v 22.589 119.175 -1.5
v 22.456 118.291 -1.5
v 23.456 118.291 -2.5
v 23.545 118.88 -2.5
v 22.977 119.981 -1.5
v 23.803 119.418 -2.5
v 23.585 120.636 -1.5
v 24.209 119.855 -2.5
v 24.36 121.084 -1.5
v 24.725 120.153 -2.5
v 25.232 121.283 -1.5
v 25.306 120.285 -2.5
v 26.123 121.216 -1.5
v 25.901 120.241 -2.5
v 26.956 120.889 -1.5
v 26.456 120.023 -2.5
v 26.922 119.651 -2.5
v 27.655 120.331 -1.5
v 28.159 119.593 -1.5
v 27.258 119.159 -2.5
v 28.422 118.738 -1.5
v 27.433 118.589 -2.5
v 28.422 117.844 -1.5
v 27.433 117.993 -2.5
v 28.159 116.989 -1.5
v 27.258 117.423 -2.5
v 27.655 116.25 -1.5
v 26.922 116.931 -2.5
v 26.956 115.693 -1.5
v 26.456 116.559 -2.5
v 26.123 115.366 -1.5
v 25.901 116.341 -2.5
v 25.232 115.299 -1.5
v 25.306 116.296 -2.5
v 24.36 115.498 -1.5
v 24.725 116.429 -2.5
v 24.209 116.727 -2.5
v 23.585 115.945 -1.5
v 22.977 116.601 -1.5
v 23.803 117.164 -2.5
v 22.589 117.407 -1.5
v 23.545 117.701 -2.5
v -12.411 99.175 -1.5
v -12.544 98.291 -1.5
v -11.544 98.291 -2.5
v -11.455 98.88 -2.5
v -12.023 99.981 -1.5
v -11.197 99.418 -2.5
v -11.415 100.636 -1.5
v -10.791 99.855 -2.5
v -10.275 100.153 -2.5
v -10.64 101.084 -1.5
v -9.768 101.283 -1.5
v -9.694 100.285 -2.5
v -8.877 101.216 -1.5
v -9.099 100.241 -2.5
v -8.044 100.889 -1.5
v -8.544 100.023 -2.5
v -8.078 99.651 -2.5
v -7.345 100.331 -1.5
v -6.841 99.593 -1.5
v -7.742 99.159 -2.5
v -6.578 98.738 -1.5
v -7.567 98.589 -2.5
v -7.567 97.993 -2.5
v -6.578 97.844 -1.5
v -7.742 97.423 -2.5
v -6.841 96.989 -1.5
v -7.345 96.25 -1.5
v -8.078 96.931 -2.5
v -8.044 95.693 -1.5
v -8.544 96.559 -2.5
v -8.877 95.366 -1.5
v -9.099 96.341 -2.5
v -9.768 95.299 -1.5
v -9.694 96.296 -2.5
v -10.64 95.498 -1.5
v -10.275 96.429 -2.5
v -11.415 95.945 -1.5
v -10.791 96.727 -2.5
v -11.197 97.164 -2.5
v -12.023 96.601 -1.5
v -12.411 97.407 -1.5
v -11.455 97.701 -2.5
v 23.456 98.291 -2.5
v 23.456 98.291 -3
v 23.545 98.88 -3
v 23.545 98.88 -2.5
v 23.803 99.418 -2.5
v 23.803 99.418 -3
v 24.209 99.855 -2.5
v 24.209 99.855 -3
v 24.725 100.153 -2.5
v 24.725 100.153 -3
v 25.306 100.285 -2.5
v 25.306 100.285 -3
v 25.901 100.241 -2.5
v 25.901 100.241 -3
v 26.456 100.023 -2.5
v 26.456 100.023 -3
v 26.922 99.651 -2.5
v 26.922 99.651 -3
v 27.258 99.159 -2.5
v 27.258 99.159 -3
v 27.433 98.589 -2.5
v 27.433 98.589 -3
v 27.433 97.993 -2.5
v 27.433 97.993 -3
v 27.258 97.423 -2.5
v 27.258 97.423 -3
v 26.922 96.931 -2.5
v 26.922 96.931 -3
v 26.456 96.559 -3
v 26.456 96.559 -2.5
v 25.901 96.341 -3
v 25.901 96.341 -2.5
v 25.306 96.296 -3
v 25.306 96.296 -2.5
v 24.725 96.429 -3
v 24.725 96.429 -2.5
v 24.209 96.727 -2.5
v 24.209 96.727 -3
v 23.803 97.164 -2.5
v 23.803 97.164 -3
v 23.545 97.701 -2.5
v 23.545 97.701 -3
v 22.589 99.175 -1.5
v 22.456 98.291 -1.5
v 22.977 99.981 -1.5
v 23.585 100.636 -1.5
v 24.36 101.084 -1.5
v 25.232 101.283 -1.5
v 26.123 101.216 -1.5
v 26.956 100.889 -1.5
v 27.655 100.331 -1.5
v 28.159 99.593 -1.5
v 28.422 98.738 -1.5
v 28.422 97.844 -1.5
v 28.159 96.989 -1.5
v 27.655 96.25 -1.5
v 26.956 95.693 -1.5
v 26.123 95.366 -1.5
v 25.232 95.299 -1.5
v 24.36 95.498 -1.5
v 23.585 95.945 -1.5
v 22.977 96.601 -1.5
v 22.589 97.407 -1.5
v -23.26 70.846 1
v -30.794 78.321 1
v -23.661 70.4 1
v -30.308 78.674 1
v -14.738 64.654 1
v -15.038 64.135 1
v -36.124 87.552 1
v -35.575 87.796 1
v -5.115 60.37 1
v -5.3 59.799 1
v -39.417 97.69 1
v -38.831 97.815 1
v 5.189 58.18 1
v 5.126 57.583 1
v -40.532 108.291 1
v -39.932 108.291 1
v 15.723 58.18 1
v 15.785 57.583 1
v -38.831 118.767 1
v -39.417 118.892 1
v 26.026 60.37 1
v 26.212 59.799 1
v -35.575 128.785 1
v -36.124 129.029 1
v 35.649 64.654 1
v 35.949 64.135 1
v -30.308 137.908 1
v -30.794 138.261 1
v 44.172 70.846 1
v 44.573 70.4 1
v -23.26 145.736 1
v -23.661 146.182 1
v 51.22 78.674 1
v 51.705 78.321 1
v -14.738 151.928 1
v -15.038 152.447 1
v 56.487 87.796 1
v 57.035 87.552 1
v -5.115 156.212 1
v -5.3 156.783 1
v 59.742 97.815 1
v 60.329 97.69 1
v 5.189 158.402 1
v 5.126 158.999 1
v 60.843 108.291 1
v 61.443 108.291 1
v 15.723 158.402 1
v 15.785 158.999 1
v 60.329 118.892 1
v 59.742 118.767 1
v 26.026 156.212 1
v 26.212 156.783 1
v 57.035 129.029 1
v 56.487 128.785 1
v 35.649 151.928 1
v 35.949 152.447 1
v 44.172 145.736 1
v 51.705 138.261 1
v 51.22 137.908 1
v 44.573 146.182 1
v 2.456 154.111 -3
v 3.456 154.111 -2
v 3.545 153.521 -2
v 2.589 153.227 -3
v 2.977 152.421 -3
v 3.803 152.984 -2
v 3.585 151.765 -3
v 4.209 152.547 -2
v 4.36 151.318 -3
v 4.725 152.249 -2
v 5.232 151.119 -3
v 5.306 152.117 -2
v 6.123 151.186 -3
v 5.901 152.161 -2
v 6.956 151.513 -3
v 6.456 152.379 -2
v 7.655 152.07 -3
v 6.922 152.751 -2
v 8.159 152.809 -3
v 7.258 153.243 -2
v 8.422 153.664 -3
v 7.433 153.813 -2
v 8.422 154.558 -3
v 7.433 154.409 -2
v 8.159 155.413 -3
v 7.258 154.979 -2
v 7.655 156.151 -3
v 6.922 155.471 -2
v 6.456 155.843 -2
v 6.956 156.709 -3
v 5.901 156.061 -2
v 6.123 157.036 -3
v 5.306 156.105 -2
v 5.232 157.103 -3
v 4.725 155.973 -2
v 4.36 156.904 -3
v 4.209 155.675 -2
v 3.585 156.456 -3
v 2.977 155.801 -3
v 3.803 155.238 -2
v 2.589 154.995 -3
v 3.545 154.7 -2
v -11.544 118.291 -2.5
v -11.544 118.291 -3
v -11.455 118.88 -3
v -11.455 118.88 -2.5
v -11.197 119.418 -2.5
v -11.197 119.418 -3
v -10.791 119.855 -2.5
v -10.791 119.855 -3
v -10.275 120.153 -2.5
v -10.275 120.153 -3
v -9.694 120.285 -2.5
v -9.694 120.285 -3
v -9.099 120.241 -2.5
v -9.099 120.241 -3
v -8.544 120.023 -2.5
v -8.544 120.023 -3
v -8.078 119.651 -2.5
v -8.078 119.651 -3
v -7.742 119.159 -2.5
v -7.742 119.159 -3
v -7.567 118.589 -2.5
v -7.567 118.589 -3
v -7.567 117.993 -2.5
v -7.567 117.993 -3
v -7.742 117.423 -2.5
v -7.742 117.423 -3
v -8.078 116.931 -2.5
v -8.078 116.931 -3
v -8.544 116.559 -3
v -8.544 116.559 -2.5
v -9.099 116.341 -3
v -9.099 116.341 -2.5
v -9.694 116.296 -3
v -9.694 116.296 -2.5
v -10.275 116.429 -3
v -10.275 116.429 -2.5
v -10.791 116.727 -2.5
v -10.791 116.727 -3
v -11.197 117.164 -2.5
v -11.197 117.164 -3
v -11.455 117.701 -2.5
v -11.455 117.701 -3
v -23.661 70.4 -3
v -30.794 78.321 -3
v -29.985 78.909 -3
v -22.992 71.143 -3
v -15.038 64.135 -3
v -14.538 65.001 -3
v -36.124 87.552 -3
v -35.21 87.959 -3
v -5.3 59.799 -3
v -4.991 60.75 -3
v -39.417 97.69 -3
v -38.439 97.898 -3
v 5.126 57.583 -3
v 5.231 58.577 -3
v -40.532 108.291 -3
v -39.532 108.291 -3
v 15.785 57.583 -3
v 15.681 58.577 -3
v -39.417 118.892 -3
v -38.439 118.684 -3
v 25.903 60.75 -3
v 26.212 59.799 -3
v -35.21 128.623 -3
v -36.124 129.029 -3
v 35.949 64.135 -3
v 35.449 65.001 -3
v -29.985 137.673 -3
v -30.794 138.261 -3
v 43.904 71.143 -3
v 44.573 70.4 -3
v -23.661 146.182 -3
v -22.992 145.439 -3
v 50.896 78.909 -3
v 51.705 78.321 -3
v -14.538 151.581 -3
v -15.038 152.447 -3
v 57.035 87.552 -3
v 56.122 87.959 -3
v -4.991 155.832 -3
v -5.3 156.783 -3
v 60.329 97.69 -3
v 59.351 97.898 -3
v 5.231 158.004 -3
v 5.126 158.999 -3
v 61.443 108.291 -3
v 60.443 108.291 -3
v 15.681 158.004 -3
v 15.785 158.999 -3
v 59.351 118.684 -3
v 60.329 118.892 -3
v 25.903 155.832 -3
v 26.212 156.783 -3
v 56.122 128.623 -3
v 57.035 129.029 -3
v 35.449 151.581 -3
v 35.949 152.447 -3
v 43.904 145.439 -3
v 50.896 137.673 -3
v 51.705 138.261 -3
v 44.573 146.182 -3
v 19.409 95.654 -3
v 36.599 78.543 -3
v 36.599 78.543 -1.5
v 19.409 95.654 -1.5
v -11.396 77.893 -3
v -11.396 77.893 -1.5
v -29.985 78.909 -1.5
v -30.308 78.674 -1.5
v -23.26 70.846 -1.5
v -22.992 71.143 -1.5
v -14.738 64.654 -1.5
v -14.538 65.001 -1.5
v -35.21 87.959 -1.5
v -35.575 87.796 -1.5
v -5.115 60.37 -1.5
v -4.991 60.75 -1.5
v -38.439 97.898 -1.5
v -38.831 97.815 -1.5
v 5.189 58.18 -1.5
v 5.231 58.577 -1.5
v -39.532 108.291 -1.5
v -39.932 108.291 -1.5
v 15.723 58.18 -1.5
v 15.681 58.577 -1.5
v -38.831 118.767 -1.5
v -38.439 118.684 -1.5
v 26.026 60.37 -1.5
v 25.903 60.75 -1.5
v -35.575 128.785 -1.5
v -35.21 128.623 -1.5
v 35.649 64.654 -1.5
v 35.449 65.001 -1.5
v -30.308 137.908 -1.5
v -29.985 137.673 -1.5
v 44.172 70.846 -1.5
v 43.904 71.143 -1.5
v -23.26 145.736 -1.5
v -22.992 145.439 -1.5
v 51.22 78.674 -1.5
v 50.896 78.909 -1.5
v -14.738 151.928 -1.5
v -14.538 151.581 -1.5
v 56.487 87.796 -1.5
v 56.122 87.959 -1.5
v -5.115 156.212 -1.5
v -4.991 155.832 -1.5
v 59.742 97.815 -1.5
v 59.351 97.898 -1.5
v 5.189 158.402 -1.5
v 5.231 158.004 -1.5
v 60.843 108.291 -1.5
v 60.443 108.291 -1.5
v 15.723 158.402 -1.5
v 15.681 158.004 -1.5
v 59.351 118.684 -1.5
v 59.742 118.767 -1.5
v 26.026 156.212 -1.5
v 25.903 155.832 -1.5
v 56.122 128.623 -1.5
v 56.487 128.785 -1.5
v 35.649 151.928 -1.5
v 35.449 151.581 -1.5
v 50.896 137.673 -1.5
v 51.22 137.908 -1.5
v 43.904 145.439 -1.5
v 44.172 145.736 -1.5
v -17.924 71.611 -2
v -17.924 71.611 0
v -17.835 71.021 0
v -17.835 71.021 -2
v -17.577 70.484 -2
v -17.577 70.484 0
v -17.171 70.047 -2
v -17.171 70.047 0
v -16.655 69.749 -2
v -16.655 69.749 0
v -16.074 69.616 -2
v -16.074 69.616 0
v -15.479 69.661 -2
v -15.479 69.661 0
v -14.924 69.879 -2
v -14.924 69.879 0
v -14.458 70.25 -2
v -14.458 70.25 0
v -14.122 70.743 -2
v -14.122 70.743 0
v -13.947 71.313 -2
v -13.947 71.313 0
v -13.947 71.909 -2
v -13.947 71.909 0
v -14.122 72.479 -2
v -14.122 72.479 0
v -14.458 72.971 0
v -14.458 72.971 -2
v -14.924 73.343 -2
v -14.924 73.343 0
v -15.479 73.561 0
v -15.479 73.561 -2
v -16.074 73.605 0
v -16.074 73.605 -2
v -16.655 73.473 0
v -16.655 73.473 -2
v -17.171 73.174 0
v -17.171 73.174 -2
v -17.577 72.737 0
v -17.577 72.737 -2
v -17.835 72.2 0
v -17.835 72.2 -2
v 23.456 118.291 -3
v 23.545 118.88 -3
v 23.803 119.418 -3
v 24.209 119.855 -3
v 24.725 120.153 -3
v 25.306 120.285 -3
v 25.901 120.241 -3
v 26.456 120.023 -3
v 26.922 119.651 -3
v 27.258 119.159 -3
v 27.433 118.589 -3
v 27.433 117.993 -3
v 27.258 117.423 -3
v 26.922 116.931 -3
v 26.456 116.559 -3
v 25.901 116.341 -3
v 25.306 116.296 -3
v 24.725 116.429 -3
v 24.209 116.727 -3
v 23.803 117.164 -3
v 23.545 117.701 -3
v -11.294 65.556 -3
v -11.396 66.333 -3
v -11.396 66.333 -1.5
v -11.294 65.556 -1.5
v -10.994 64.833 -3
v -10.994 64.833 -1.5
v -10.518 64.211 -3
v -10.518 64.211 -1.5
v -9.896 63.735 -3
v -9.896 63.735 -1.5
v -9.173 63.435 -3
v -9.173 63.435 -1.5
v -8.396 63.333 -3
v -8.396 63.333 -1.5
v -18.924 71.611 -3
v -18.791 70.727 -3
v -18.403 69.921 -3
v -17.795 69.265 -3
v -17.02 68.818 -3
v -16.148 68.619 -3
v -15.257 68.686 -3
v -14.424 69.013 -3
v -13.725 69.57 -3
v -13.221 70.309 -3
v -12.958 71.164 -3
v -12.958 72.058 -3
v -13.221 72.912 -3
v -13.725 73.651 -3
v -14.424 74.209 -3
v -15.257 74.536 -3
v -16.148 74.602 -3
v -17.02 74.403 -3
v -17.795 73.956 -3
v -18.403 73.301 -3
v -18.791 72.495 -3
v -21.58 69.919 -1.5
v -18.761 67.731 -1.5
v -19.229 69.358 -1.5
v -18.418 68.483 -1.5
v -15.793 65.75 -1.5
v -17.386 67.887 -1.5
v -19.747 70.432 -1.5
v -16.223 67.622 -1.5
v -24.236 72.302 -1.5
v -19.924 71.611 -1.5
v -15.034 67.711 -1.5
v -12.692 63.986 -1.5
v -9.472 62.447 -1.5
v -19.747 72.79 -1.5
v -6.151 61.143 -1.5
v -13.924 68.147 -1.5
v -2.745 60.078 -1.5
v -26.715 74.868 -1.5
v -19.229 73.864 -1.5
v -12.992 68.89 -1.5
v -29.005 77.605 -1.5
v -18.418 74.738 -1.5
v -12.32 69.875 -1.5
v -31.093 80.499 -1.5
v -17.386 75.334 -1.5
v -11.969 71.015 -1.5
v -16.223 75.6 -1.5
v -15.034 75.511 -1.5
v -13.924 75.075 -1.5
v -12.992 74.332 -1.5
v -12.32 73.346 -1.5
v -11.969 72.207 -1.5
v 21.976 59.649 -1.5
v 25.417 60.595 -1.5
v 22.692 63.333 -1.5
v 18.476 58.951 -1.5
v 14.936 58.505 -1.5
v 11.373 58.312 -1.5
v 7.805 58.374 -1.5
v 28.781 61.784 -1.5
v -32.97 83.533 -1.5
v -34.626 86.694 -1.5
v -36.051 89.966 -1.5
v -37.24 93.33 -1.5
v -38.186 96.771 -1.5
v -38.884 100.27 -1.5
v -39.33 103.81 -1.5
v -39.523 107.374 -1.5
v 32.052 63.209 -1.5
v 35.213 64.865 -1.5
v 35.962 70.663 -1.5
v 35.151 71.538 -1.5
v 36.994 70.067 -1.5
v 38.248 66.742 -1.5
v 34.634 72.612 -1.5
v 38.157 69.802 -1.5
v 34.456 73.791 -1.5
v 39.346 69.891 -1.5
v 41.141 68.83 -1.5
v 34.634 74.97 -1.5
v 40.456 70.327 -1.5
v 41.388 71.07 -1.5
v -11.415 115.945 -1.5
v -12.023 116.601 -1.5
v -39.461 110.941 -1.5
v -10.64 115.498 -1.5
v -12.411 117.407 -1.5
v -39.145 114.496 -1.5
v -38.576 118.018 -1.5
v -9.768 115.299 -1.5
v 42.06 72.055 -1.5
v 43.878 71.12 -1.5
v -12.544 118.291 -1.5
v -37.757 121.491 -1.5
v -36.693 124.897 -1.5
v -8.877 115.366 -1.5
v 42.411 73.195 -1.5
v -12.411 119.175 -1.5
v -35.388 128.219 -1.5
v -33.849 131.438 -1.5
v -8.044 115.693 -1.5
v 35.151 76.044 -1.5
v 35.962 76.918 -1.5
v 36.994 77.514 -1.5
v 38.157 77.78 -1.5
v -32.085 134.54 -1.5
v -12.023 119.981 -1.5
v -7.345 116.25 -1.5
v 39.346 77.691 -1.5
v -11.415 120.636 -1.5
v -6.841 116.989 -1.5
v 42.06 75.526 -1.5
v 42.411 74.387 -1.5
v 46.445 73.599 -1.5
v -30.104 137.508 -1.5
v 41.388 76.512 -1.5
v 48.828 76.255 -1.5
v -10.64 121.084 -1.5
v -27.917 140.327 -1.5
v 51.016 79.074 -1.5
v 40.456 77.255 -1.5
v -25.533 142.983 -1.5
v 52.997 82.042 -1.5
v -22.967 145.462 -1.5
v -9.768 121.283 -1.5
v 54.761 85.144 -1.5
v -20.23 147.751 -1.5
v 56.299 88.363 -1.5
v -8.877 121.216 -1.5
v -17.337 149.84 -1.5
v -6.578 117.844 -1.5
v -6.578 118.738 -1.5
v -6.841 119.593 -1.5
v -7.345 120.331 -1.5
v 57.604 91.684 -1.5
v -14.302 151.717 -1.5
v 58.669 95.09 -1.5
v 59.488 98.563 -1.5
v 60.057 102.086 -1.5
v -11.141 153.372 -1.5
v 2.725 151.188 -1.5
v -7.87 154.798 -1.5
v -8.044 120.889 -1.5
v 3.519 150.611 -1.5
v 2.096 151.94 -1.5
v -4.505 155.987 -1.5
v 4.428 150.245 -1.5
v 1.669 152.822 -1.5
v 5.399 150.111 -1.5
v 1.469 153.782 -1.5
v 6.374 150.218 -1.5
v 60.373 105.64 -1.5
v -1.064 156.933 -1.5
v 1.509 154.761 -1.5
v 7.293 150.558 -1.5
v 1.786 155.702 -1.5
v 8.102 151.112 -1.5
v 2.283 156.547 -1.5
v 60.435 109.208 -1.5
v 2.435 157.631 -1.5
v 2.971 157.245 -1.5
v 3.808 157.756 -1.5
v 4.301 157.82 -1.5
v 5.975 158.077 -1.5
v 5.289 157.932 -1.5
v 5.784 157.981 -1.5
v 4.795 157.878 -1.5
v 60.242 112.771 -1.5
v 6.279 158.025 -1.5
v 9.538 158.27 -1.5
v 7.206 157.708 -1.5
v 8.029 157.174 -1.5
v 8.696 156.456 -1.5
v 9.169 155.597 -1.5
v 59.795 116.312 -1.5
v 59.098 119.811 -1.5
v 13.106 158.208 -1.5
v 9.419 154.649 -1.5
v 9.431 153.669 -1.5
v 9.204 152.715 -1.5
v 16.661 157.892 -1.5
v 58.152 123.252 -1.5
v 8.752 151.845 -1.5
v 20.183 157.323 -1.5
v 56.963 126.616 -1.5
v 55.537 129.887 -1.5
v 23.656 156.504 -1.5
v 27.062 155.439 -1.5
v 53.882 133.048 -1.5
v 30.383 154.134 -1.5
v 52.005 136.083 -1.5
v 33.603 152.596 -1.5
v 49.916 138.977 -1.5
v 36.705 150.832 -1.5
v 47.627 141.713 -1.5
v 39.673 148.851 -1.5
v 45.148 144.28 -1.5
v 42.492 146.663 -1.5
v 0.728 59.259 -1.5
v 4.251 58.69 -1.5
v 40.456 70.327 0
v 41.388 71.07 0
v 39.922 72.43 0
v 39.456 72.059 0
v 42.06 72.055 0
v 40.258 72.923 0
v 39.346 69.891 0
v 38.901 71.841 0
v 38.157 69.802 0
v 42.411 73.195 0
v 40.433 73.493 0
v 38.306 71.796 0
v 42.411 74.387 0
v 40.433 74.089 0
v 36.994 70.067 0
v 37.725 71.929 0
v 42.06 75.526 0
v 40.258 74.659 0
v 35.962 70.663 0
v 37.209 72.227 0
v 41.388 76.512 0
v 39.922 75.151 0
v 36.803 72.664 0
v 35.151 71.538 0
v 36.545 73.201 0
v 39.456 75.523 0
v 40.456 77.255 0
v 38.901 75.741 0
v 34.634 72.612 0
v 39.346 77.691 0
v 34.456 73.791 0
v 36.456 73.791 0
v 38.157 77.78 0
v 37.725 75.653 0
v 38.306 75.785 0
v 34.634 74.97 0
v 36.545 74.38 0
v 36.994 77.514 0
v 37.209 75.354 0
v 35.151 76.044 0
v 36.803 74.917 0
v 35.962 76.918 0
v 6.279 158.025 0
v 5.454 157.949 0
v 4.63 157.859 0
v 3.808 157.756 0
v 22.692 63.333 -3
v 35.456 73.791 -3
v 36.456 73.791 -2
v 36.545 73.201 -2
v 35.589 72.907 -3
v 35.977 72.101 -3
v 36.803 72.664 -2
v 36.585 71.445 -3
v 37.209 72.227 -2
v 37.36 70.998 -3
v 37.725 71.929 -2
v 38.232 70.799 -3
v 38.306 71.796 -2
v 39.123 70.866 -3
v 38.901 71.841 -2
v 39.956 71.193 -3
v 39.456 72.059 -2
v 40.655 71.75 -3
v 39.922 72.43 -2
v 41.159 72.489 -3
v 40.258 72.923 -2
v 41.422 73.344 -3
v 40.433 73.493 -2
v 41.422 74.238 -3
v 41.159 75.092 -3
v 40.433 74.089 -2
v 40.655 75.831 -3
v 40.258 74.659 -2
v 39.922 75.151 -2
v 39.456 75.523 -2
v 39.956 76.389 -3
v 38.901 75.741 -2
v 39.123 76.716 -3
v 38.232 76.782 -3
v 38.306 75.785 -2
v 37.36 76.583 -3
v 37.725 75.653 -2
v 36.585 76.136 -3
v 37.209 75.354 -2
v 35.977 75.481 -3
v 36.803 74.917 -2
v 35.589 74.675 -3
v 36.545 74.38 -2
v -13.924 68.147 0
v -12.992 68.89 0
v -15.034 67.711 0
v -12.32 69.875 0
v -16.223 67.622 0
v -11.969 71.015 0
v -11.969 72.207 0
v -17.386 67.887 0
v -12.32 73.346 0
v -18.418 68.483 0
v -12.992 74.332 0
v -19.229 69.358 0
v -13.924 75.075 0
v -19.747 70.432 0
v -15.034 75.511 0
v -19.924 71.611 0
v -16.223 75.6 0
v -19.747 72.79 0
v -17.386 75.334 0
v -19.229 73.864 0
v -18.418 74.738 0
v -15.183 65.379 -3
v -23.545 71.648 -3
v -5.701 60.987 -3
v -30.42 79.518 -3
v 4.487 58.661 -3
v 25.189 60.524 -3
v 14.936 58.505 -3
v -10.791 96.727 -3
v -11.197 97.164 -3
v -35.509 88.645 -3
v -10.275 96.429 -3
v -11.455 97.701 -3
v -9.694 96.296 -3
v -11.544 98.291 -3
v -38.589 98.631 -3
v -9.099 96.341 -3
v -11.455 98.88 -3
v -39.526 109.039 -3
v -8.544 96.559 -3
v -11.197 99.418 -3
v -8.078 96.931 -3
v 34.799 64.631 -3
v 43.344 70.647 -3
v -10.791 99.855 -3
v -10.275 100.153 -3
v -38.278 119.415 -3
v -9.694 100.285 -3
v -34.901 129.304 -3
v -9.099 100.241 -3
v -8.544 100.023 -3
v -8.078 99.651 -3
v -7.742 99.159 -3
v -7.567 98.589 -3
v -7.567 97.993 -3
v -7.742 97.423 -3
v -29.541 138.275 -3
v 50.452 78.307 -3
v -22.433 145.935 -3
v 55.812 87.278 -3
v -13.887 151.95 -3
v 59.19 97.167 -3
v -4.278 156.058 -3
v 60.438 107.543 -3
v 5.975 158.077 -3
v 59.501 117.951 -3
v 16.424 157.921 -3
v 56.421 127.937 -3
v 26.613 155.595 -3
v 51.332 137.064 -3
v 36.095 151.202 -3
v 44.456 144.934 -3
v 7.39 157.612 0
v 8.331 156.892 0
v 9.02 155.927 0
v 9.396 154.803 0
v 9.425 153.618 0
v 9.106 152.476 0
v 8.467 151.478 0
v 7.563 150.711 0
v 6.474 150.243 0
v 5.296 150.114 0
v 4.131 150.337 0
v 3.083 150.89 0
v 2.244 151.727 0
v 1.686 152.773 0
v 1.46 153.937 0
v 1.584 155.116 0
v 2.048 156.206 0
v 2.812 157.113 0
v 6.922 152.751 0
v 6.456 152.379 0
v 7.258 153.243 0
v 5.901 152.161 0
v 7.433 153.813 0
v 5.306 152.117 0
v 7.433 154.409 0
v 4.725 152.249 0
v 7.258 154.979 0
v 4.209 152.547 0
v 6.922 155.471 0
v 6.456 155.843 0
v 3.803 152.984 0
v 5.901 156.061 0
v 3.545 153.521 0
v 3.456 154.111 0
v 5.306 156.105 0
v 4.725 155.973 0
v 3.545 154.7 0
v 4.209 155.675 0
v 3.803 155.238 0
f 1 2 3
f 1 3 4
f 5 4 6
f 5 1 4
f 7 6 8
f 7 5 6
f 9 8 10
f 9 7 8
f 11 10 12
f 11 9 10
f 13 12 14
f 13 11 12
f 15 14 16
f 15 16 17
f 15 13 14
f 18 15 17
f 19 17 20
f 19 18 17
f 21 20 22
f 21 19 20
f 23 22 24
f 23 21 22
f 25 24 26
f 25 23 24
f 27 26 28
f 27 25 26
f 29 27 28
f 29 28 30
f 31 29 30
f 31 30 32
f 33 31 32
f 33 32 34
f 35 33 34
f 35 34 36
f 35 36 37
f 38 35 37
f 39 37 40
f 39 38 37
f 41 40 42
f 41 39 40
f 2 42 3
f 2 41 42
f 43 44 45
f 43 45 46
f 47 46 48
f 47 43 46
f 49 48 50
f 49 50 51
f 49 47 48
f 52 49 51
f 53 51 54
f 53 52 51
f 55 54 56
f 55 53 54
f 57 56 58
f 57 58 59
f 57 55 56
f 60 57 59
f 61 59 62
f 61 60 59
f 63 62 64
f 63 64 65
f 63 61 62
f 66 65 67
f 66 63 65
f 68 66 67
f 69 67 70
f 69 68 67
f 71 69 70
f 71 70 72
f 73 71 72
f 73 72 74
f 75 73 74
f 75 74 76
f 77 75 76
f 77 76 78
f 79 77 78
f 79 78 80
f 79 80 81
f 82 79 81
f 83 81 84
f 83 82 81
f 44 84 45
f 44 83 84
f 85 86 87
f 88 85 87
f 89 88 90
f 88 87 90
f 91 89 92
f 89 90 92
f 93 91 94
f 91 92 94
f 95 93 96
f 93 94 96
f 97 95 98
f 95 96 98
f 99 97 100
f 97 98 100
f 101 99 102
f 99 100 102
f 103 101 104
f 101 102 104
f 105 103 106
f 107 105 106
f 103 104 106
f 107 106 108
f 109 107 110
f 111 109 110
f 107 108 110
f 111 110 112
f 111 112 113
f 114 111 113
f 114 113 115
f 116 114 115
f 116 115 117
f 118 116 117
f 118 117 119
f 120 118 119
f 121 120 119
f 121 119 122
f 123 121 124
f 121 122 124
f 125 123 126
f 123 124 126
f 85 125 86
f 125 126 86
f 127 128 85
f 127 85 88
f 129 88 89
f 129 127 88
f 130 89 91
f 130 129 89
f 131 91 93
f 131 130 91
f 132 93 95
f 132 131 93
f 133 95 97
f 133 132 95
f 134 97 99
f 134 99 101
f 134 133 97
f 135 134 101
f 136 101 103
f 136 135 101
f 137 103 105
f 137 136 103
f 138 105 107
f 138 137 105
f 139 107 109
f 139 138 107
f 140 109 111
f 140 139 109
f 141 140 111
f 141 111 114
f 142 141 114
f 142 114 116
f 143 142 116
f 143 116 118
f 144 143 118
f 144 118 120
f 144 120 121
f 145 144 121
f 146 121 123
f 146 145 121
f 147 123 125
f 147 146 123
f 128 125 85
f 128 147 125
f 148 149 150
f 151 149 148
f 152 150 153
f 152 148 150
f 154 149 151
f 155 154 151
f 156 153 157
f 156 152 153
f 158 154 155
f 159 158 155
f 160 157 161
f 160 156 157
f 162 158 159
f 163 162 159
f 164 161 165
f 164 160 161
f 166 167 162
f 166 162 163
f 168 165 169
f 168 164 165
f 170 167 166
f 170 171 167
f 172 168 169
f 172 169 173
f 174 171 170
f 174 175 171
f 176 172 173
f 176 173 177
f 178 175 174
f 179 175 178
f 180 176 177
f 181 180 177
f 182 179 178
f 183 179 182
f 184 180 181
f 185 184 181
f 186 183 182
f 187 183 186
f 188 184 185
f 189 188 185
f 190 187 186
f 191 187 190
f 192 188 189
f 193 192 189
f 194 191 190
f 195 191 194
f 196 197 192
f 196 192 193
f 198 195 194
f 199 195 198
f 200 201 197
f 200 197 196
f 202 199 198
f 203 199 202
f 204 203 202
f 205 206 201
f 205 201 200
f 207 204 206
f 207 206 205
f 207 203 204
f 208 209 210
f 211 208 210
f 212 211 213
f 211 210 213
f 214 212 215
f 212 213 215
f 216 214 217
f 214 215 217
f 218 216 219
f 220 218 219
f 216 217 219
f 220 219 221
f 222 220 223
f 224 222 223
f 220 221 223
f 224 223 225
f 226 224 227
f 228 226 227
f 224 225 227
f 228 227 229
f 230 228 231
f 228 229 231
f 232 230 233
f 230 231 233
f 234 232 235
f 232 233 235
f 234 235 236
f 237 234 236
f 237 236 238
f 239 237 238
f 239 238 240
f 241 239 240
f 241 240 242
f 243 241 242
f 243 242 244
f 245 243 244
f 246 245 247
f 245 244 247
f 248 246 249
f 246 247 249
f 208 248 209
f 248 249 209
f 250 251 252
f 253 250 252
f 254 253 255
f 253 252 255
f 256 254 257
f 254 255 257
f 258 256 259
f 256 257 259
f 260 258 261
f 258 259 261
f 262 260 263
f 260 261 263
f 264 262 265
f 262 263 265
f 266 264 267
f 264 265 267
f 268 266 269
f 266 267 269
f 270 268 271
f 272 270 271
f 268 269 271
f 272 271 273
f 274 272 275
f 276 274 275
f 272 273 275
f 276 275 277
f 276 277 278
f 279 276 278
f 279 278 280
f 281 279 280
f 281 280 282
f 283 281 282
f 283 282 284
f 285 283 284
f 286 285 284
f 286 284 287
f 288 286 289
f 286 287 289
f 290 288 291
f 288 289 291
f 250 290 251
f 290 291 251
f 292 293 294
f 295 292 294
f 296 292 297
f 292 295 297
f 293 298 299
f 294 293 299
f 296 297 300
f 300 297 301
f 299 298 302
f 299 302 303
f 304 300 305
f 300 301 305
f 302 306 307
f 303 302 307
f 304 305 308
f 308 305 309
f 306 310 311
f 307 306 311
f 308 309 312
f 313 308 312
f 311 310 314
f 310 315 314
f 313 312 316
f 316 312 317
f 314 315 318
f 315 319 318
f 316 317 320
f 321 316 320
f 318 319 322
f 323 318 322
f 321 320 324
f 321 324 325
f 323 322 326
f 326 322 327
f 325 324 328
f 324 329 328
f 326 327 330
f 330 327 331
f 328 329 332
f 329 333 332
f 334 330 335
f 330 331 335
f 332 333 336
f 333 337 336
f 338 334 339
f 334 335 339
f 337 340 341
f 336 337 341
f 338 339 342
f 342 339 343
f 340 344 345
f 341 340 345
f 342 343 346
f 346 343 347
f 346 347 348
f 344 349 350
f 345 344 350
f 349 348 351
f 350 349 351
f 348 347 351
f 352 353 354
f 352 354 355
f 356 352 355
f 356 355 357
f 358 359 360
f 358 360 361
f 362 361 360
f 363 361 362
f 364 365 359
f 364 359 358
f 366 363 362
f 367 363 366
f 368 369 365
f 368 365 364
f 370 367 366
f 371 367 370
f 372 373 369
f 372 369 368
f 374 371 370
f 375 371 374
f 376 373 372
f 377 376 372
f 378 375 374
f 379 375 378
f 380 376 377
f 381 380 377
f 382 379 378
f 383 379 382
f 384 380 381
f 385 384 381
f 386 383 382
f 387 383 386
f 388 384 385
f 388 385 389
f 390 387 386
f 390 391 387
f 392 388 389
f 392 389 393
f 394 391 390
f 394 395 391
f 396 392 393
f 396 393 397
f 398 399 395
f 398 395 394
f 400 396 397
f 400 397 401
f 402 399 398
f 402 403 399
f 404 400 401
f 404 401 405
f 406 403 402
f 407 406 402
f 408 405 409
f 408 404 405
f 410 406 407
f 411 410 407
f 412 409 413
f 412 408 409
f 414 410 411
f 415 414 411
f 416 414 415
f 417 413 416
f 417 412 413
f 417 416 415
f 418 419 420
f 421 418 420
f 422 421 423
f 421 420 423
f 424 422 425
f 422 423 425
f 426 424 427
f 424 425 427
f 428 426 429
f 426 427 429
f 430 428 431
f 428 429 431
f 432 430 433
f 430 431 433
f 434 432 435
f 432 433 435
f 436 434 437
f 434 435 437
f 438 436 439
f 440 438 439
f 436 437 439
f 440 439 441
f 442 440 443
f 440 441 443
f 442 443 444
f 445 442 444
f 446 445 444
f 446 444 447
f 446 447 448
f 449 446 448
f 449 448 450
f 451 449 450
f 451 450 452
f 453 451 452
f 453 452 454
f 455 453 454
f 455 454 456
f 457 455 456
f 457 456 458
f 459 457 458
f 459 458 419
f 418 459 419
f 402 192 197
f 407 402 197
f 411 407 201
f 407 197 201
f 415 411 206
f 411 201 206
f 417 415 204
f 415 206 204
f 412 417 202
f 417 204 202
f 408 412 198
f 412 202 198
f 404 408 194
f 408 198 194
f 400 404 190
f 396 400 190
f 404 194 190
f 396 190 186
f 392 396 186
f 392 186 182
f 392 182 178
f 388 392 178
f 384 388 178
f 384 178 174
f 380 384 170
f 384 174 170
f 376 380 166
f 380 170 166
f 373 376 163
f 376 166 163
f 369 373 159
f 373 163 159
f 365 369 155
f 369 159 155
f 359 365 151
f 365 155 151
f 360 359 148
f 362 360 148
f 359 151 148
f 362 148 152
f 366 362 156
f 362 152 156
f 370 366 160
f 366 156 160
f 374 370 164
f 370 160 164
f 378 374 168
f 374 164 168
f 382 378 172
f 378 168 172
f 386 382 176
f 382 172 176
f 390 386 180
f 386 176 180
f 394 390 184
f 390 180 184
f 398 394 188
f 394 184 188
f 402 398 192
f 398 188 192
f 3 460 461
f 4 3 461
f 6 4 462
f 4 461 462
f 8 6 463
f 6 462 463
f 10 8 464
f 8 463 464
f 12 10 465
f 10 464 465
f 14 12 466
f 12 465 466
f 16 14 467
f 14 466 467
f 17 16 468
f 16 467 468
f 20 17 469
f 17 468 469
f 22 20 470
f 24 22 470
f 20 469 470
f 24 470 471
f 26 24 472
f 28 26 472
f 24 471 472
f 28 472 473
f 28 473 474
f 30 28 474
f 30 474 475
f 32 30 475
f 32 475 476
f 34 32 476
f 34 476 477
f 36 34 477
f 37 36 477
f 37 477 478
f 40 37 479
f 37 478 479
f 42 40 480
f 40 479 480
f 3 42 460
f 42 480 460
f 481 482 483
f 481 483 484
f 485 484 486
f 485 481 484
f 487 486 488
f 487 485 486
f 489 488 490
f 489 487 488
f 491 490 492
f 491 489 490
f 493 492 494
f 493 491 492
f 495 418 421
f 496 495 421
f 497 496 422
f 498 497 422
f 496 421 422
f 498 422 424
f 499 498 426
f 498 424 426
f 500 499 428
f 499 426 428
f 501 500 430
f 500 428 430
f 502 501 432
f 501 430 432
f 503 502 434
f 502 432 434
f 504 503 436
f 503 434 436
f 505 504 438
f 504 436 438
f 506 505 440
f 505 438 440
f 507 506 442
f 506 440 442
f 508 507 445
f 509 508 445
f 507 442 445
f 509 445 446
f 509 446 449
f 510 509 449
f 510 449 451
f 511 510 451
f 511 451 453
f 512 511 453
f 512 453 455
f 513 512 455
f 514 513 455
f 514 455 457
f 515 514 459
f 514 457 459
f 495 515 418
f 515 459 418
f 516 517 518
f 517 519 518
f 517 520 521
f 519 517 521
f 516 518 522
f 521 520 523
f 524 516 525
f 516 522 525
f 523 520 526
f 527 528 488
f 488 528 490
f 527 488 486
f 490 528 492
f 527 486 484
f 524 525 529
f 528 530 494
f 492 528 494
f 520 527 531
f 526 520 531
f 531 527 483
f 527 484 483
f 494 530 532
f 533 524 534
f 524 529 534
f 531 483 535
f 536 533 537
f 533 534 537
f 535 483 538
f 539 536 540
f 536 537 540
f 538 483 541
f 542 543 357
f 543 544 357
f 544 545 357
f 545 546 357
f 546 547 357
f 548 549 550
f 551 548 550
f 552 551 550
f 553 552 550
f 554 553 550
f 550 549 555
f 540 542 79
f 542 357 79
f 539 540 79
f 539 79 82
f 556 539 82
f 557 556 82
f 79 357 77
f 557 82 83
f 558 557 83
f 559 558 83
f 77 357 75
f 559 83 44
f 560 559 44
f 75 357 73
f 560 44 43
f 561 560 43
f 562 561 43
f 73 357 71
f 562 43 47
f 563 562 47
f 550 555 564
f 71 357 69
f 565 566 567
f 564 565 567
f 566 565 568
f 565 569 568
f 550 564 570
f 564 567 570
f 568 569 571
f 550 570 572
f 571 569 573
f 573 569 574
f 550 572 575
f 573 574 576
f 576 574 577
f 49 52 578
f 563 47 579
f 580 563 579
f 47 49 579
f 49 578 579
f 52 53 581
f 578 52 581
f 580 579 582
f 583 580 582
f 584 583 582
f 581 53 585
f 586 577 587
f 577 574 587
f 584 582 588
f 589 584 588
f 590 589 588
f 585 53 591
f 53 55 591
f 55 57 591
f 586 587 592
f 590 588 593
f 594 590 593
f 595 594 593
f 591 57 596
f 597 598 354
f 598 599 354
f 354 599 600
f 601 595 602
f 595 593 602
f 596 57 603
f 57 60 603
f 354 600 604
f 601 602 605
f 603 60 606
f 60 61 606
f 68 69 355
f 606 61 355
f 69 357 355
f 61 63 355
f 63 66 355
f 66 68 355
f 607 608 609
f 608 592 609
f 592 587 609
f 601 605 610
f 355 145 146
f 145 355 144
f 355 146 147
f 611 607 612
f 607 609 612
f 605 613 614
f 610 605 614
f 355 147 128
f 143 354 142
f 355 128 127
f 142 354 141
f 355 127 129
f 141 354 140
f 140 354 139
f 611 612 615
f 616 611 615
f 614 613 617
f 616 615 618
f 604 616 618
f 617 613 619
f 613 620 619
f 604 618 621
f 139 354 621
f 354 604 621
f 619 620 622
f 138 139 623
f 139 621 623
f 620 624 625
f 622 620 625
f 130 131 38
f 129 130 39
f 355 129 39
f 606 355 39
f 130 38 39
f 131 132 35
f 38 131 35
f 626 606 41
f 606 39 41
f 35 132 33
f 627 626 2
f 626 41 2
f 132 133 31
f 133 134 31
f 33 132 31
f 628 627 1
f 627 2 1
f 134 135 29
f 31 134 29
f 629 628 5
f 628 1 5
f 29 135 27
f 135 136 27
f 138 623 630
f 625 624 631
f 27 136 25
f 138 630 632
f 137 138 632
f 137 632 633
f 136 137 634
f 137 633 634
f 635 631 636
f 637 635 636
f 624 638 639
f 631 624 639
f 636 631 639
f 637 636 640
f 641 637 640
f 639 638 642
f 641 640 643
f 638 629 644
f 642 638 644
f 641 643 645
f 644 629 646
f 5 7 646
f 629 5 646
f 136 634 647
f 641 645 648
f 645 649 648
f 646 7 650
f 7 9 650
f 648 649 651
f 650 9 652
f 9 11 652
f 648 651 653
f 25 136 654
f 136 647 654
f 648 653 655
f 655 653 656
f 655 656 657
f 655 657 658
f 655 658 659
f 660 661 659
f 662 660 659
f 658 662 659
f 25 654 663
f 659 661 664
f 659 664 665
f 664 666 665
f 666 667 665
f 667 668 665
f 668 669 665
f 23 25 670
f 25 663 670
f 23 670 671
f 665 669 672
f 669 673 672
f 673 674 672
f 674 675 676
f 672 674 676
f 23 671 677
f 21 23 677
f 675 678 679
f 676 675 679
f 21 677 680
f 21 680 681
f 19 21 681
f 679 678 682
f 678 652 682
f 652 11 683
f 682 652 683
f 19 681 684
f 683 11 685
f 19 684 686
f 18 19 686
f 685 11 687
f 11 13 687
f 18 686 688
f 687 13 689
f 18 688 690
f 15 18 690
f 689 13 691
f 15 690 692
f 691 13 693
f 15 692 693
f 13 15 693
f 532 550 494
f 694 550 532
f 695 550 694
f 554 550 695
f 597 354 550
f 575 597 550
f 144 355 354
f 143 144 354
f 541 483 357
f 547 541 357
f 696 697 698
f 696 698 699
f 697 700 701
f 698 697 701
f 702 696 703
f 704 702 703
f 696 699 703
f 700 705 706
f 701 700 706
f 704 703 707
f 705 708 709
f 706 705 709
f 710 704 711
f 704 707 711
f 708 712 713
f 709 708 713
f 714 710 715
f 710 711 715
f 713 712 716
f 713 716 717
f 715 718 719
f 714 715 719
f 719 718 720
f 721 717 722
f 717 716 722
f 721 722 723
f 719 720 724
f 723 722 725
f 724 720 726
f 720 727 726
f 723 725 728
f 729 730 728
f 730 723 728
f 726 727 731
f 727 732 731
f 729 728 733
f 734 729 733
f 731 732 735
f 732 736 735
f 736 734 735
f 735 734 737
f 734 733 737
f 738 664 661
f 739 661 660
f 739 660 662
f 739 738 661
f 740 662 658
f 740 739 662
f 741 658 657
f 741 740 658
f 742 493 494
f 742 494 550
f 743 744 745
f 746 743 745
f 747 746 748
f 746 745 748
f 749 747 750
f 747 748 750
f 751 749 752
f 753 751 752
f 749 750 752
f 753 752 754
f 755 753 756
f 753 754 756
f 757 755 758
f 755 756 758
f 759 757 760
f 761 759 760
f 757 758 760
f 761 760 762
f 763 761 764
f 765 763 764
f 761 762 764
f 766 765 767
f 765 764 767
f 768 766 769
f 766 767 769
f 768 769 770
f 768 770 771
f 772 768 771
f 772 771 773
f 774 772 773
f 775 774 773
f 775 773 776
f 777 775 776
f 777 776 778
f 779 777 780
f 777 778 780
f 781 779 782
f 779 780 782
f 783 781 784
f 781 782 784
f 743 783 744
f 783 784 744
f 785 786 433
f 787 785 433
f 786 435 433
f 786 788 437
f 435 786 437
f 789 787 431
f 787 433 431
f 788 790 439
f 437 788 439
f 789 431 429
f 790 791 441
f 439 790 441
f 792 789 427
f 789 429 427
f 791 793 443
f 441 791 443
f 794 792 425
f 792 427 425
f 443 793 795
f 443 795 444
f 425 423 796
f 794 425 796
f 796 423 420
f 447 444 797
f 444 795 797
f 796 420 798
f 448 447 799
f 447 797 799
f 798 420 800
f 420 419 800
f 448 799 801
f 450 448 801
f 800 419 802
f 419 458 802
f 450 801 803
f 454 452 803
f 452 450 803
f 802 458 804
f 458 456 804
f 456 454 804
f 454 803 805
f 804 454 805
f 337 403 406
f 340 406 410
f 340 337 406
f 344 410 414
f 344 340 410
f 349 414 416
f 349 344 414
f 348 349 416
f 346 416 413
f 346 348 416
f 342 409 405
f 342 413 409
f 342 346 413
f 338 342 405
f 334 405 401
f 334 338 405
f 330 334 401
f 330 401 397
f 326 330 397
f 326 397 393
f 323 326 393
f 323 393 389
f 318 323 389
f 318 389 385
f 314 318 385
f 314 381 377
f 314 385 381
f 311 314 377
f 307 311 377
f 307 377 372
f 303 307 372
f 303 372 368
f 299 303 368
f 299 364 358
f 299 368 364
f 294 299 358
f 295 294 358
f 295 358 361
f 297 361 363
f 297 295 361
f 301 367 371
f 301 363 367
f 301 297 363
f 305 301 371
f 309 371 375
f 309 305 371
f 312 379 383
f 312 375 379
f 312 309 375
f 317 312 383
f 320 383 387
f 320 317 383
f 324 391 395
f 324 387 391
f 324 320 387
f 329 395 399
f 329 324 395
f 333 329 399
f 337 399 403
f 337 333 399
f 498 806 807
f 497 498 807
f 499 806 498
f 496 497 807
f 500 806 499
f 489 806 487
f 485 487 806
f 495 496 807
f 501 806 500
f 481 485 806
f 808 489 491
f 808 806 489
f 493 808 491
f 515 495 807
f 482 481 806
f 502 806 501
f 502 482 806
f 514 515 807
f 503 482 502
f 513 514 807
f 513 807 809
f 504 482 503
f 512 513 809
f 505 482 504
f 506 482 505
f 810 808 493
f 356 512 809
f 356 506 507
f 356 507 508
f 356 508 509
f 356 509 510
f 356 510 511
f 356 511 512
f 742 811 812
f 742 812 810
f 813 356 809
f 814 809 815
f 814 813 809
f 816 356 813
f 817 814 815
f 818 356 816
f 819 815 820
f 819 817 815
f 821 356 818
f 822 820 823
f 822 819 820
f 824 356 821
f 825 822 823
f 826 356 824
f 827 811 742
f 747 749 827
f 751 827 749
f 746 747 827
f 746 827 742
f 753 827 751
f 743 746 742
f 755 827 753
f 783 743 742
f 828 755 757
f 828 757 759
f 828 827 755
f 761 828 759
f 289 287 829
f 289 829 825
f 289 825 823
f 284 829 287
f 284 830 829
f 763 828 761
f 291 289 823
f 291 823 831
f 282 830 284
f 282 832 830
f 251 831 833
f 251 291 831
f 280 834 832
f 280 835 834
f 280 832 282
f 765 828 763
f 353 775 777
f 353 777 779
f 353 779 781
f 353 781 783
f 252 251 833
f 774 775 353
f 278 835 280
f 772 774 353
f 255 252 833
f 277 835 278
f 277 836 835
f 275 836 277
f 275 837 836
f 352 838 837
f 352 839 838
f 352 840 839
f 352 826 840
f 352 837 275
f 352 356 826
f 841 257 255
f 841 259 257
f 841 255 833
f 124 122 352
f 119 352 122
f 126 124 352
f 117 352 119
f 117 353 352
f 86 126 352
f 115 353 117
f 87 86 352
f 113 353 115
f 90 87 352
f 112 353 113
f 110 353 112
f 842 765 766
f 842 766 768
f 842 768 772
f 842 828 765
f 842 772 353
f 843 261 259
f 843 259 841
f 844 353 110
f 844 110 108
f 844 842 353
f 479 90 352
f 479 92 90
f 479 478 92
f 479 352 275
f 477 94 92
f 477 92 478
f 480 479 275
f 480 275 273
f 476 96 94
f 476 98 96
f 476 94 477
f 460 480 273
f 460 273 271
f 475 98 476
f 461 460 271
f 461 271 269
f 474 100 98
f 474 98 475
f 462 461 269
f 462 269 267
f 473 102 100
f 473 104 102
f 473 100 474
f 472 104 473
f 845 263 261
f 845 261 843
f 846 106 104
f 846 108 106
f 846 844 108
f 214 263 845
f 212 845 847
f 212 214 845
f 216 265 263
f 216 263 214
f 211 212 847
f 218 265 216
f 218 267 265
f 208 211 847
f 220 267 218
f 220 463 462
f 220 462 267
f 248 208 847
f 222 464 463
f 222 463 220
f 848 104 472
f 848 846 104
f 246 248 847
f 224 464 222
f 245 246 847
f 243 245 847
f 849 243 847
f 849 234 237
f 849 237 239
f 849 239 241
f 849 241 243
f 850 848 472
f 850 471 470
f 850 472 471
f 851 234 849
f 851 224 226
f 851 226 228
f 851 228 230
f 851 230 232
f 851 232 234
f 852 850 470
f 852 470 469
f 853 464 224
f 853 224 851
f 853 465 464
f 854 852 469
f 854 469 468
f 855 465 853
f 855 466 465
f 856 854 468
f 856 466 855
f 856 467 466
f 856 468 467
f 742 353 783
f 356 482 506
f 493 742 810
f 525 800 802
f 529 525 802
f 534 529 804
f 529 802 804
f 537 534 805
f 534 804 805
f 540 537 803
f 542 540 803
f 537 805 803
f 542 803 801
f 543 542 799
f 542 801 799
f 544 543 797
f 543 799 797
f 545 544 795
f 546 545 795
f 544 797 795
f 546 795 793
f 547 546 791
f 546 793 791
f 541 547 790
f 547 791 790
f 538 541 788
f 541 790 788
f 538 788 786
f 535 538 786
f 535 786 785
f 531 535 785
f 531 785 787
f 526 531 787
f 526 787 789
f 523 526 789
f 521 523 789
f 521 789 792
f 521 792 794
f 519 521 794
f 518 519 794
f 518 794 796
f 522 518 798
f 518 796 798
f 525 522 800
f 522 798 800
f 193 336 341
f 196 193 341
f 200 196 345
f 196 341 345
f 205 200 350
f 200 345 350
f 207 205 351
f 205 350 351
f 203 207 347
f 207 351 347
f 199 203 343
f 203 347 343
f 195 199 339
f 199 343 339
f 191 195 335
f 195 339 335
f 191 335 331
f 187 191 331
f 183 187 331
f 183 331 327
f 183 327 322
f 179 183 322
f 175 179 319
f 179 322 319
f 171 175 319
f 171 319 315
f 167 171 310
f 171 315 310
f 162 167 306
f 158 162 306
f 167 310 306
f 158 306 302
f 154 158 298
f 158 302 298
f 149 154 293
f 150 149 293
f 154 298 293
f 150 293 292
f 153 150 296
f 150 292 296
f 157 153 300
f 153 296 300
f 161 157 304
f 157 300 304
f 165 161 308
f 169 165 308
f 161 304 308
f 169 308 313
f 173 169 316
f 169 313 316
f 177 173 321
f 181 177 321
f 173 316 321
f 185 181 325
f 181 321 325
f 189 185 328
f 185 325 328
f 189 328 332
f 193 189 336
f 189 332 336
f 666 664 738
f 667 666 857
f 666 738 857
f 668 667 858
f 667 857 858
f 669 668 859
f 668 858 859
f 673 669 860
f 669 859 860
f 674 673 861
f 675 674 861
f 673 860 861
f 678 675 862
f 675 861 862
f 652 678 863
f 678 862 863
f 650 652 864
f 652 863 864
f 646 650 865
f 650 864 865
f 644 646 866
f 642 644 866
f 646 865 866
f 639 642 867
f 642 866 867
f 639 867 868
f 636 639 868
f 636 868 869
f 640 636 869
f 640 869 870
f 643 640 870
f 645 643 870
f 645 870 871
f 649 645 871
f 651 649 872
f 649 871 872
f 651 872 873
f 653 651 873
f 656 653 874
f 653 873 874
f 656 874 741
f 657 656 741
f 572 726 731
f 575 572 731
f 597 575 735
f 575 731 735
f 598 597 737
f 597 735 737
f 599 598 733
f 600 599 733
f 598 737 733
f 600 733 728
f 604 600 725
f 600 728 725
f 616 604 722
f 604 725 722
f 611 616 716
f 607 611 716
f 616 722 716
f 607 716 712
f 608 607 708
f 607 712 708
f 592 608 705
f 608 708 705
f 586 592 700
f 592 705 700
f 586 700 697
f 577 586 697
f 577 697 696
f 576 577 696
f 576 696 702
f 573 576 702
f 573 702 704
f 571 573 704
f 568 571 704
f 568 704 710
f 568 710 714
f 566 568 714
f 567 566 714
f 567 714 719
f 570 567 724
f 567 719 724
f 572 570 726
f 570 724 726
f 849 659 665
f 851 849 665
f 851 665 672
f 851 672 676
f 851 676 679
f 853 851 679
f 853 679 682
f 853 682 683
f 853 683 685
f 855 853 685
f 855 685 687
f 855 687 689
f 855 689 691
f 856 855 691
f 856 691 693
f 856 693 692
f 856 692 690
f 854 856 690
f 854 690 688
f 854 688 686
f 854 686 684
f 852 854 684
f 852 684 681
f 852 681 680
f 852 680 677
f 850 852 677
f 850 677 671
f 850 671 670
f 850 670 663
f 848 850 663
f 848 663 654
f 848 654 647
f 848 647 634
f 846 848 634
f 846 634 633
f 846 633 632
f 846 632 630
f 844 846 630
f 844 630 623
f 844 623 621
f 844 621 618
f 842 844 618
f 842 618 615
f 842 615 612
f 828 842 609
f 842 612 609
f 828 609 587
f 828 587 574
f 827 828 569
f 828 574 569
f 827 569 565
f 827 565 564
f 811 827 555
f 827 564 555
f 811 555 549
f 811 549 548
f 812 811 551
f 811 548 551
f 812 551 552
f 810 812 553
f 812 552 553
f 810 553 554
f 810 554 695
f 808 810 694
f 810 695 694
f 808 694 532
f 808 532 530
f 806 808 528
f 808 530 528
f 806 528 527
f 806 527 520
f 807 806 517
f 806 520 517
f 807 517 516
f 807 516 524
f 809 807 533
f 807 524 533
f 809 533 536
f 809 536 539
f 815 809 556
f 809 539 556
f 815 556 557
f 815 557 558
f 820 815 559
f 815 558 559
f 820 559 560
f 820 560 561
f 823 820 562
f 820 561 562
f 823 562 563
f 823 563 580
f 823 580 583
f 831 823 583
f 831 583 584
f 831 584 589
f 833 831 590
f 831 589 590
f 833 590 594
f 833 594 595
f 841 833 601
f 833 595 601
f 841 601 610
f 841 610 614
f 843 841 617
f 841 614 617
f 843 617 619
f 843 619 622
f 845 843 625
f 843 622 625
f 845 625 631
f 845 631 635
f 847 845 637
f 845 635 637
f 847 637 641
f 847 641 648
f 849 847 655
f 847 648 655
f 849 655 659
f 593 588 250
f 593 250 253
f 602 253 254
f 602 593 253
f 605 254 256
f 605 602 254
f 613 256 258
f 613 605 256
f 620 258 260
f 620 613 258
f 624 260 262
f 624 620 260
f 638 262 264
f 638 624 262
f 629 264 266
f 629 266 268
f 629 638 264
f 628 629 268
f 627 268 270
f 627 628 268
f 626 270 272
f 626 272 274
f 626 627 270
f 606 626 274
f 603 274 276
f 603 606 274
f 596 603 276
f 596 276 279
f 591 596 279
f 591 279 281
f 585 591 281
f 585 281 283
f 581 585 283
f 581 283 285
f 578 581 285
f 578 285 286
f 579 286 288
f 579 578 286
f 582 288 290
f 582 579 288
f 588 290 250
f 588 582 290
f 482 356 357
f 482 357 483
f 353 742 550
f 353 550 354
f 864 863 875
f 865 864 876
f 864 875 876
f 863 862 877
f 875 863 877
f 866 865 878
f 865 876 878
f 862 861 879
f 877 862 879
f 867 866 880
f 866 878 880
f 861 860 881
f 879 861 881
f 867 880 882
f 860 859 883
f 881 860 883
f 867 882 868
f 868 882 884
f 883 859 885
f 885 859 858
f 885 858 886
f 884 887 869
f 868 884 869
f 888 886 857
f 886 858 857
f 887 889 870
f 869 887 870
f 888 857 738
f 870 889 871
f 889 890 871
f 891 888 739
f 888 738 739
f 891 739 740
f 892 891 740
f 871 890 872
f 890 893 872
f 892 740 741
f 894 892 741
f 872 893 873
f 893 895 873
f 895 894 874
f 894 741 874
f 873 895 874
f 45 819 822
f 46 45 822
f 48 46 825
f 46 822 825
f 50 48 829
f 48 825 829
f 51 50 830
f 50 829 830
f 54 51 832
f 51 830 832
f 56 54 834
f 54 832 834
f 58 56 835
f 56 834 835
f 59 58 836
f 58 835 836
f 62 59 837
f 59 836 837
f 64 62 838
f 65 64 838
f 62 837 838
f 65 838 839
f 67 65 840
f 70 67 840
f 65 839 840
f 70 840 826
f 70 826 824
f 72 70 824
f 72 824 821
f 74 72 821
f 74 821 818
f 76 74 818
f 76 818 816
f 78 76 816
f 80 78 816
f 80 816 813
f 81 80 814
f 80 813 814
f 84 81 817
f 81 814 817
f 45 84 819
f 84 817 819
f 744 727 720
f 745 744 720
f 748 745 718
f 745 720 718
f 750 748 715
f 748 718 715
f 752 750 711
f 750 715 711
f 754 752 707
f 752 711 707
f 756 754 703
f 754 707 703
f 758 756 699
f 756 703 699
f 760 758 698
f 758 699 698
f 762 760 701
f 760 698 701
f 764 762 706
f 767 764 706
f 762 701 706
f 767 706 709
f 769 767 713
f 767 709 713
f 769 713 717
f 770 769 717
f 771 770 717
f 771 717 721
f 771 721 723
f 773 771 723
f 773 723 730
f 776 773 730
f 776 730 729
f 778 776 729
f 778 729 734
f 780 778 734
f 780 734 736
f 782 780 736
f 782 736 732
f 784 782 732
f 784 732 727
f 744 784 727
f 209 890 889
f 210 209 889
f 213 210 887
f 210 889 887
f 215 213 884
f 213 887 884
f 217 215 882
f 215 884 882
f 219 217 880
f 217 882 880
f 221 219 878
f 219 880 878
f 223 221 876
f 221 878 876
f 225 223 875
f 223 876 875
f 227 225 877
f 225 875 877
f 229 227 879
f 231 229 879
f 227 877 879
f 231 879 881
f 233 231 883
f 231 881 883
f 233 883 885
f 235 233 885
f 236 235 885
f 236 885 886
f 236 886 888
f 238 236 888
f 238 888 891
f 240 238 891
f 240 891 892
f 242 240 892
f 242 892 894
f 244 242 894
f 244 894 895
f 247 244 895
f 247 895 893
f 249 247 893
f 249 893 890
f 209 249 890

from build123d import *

# Parameters (mm, degrees)
SKETCH1_R             = 4
SKETCH1_R_2           = 2.00000381
BOSS_EXTRUDE1_DEPTH   = 1.5
BOSS_EXTRUDE1_2_DEPTH = 1.5
SKETCH1_R_3           = 2
BOSS_EXTRUDE1_3_DEPTH = 1.5
SKETCH2_R             = 49.987399035
BOSS_EXTRUDE2_DEPTH   = 1.5
CUT_EXTRUDE1_REACH    = 171.433
SKETCH3_R             = 2
SKETCH3_R_2           = 2.00000381
CHAMFER1_SIZE         = 1
CUT_EXTRUDE7_REACH    = 171.453
SKETCH5_R             = 50.987399035
SKETCH5_R_2           = 49.987399035
BOSS_EXTRUDE3_DEPTH   = 4
SKETCH6_R             = 50.387399035
SKETCH6_R_2           = 49.909599328
CUT_EXTRUDE8_DEPTH    = 2.5
SKETCH7_R             = 2
CUT_EXTRUDE9_DEPTH    = 1.5
CHAMFER2_SIZE         = 1


with BuildPart() as part:
    # Sketch1 → Boss-Extrude1 (new body)
    with BuildSketch(Plane(origin=(0, 0, 0), x_dir=(-1, 0, 0), z_dir=(0, 0, -1))):
        with Locations((15.924275789, 71.610816006)):
            Circle(SKETCH1_R)
        with Locations((15.924275789, 71.610816006)):
            Circle(SKETCH1_R_2, mode=Mode.SUBTRACT)
    extrude(amount=BOSS_EXTRUDE1_DEPTH)



with BuildPart() as body_2:
    # Sketch1 → Boss-Extrude1 2 (new body)
    with BuildSketch(Plane(origin=(0, 0, 0), x_dir=(-1, 0, 0), z_dir=(0, 0, -1))):
        with Locations((-38.455833431, 73.790821086)):
            Circle(SKETCH1_R)
        with Locations((-38.455833431, 73.790821086)):
            Circle(SKETCH1_R_2, mode=Mode.SUBTRACT)
    extrude(amount=BOSS_EXTRUDE1_2_DEPTH)


with BuildPart() as body_3:
    # Sketch1 → Boss-Extrude1 3 (new body)
    with BuildSketch(Plane(origin=(0, 0, 0), x_dir=(-1, 0, 0), z_dir=(0, 0, -1))):
        with Locations((-5.455767391, 154.110981107)):
            Circle(SKETCH1_R)
        with Locations((-5.455767391, 154.110981107)):
            Circle(SKETCH1_R_3, mode=Mode.SUBTRACT)
    extrude(amount=BOSS_EXTRUDE1_3_DEPTH)


with BuildPart() as part_1:
    add(part.part)

    add(body_2.part)  # Boss-Extrude2 merges body 2

    add(body_3.part)  # Boss-Extrude2 merges body 3
    # Sketch2 → Boss-Extrude2 (add)
    with BuildSketch(Plane(origin=(0, 0, -1.5), x_dir=(-1, 0, 0), z_dir=(0, 0, -1))):
        with Locations(Location((-10.455777551, 108.290889666, 0), (0, 0, 84.857617519))):
            Circle(SKETCH2_R)
    extrude(amount=BOSS_EXTRUDE2_DEPTH)

    # Sketch3 → Cut-Extrude1 (cut, up to next)
    with BuildSketch(Plane.XY.offset(-1.5), mode=Mode.PRIVATE) as cut_extrude1_sk1:
        with Locations(Location((5.455767391, 154.110981107, 0), (0, 0, 180))):
            Circle(SKETCH3_R)
    cut_extrude1_tool1 = extrude(cut_extrude1_sk1.sketch, amount=-CUT_EXTRUDE1_REACH, mode=Mode.PRIVATE) & part_1.part
    # Sketch3 → Cut-Extrude1 (cut, up to next)
    with BuildSketch(Plane.XY.offset(-1.5), mode=Mode.PRIVATE) as cut_extrude1_sk2:
        with Locations(Location((-15.924275789, 71.610816006, 0), (0, 0, 180))):
            Circle(SKETCH3_R_2)
    cut_extrude1_tool2 = extrude(cut_extrude1_sk2.sketch, amount=-CUT_EXTRUDE1_REACH, mode=Mode.PRIVATE) & part_1.part
    # Sketch3 → Cut-Extrude1 (cut, up to next)
    with BuildSketch(Plane.XY.offset(-1.5), mode=Mode.PRIVATE) as cut_extrude1_sk3:
        with Locations(Location((38.455833431, 73.790821086, 0), (0, 0, 180))):
            Circle(SKETCH3_R_2)
    cut_extrude1_tool3 = extrude(cut_extrude1_sk3.sketch, amount=-CUT_EXTRUDE1_REACH, mode=Mode.PRIVATE) & part_1.part
    add(cut_extrude1_tool1.solids().sort_by_distance((5.455767, 154.110981, -1.5))[0], mode=Mode.SUBTRACT)
    add(cut_extrude1_tool2.solids().sort_by_distance((-15.924276, 71.610816, -1.5))[0], mode=Mode.SUBTRACT)
    add(cut_extrude1_tool3.solids().sort_by_distance((38.455833, 73.790821, -1.5))[0], mode=Mode.SUBTRACT)

    # Chamfer1
    chamfer1_edges = [part_1.edges().sort_by_distance(p)[0] for p in [
        (7.455767391, 154.110981107, -3),
        (-13.924271979, 71.610816006, -3),
        (40.455837241, 73.790821086, -3),
    ]]
    chamfer(chamfer1_edges, length=CHAMFER1_SIZE)

    # Sketch4 → Cut-Extrude7 (cut, up to next)
    with BuildSketch(Plane(origin=(0, 0, -3), x_dir=(-1, 0, 0), z_dir=(0, 0, -1)), mode=Mode.PRIVATE) as cut_extrude7_sk1:
        with BuildLine():
            Line((-36.598932893, 78.543247745), (-19.408853497, 95.653922432))
            Line((-19.408853497, 95.653922432), (11.396229527, 77.89280991))
            Line((11.396229527, 77.89280991), (11.396229527, 66.33279975))
            ThreePointArc((11.396229527, 66.33279975), (10.517549871, 64.211479407), (8.396229527, 63.33279975))
            Line((8.396229527, 63.33279975), (1.609246579, 63.33279975))
            Line((1.609246579, 63.33279975), (-22.692379024, 63.33279975))
            Line((-22.692379024, 63.33279975), (-36.598932893, 78.543247745))
        make_face()
    cut_extrude7_tool1 = extrude(cut_extrude7_sk1.sketch, amount=-CUT_EXTRUDE7_REACH, mode=Mode.PRIVATE) & part_1.part
    add(cut_extrude7_tool1.solids().sort_by_distance((11.68885, 76.427285, -3))[0], mode=Mode.SUBTRACT)


with BuildPart() as body_2_2:
    # Sketch5 → Boss-Extrude3 (new body)
    with BuildSketch(Plane(origin=(5.822978124, 110.39290389, -3), x_dir=(1, 0, 0), z_dir=(0, 0, 1))):
        with Locations((4.632799428, -2.102014224)):
            Circle(SKETCH5_R)
        with Locations((4.632799428, -2.102014224)):
            Circle(SKETCH5_R_2, mode=Mode.SUBTRACT)
    extrude(amount=BOSS_EXTRUDE3_DEPTH)


with BuildPart() as cut_extrude8_tool:
    # Sketch6 → Cut-Extrude8 (new body)
    with BuildSketch(Plane.XY.offset(1)):
        with Locations((10.455777551, 108.290889666)):
            Circle(SKETCH6_R)
        with Locations((10.455777551, 108.290889666)):
            Circle(SKETCH6_R_2, mode=Mode.SUBTRACT)
    extrude(amount=-CUT_EXTRUDE8_DEPTH)


with BuildPart() as part_2:
    add(part_1.part)

    # Cut-Extrude8: cut by cut_extrude8_tool
    add(cut_extrude8_tool.part, mode=Mode.SUBTRACT)

    # Sketch7 → Cut-Extrude9 (cut)
    with BuildSketch(Plane(origin=(0, 0, -3), x_dir=(-1, 0, 0), z_dir=(0, 0, -1))):
        with Locations((-25.455777551, 98.290889666)):
            Circle(SKETCH7_R)
        with Locations((9.544222449, 98.290889666)):
            Circle(SKETCH7_R)
        with Locations((-25.455777551, 118.290889666)):
            Circle(SKETCH7_R)
        with Locations((9.544222449, 118.290889666)):
            Circle(SKETCH7_R)
    extrude(amount=-CUT_EXTRUDE9_DEPTH, mode=Mode.SUBTRACT)

    # Chamfer2
    chamfer2_edges = [part_2.edges().sort_by_distance(p)[0] for p in [
        (-7.544222449, 98.290889666, -1.5),
        (27.455777551, 118.290889666, -1.5),
        (-7.544222449, 118.290889666, -1.5),
        (27.455777551, 98.290889666, -1.5),
    ]]
    chamfer(chamfer2_edges, length=CHAMFER2_SIZE)


with BuildPart() as body_2_2_1:
    add(body_2_2.part)

    # Cut-Extrude8: cut by cut_extrude8_tool
    add(cut_extrude8_tool.part, mode=Mode.SUBTRACT)


solid = Compound([part_2.part, body_2_2_1.part])
